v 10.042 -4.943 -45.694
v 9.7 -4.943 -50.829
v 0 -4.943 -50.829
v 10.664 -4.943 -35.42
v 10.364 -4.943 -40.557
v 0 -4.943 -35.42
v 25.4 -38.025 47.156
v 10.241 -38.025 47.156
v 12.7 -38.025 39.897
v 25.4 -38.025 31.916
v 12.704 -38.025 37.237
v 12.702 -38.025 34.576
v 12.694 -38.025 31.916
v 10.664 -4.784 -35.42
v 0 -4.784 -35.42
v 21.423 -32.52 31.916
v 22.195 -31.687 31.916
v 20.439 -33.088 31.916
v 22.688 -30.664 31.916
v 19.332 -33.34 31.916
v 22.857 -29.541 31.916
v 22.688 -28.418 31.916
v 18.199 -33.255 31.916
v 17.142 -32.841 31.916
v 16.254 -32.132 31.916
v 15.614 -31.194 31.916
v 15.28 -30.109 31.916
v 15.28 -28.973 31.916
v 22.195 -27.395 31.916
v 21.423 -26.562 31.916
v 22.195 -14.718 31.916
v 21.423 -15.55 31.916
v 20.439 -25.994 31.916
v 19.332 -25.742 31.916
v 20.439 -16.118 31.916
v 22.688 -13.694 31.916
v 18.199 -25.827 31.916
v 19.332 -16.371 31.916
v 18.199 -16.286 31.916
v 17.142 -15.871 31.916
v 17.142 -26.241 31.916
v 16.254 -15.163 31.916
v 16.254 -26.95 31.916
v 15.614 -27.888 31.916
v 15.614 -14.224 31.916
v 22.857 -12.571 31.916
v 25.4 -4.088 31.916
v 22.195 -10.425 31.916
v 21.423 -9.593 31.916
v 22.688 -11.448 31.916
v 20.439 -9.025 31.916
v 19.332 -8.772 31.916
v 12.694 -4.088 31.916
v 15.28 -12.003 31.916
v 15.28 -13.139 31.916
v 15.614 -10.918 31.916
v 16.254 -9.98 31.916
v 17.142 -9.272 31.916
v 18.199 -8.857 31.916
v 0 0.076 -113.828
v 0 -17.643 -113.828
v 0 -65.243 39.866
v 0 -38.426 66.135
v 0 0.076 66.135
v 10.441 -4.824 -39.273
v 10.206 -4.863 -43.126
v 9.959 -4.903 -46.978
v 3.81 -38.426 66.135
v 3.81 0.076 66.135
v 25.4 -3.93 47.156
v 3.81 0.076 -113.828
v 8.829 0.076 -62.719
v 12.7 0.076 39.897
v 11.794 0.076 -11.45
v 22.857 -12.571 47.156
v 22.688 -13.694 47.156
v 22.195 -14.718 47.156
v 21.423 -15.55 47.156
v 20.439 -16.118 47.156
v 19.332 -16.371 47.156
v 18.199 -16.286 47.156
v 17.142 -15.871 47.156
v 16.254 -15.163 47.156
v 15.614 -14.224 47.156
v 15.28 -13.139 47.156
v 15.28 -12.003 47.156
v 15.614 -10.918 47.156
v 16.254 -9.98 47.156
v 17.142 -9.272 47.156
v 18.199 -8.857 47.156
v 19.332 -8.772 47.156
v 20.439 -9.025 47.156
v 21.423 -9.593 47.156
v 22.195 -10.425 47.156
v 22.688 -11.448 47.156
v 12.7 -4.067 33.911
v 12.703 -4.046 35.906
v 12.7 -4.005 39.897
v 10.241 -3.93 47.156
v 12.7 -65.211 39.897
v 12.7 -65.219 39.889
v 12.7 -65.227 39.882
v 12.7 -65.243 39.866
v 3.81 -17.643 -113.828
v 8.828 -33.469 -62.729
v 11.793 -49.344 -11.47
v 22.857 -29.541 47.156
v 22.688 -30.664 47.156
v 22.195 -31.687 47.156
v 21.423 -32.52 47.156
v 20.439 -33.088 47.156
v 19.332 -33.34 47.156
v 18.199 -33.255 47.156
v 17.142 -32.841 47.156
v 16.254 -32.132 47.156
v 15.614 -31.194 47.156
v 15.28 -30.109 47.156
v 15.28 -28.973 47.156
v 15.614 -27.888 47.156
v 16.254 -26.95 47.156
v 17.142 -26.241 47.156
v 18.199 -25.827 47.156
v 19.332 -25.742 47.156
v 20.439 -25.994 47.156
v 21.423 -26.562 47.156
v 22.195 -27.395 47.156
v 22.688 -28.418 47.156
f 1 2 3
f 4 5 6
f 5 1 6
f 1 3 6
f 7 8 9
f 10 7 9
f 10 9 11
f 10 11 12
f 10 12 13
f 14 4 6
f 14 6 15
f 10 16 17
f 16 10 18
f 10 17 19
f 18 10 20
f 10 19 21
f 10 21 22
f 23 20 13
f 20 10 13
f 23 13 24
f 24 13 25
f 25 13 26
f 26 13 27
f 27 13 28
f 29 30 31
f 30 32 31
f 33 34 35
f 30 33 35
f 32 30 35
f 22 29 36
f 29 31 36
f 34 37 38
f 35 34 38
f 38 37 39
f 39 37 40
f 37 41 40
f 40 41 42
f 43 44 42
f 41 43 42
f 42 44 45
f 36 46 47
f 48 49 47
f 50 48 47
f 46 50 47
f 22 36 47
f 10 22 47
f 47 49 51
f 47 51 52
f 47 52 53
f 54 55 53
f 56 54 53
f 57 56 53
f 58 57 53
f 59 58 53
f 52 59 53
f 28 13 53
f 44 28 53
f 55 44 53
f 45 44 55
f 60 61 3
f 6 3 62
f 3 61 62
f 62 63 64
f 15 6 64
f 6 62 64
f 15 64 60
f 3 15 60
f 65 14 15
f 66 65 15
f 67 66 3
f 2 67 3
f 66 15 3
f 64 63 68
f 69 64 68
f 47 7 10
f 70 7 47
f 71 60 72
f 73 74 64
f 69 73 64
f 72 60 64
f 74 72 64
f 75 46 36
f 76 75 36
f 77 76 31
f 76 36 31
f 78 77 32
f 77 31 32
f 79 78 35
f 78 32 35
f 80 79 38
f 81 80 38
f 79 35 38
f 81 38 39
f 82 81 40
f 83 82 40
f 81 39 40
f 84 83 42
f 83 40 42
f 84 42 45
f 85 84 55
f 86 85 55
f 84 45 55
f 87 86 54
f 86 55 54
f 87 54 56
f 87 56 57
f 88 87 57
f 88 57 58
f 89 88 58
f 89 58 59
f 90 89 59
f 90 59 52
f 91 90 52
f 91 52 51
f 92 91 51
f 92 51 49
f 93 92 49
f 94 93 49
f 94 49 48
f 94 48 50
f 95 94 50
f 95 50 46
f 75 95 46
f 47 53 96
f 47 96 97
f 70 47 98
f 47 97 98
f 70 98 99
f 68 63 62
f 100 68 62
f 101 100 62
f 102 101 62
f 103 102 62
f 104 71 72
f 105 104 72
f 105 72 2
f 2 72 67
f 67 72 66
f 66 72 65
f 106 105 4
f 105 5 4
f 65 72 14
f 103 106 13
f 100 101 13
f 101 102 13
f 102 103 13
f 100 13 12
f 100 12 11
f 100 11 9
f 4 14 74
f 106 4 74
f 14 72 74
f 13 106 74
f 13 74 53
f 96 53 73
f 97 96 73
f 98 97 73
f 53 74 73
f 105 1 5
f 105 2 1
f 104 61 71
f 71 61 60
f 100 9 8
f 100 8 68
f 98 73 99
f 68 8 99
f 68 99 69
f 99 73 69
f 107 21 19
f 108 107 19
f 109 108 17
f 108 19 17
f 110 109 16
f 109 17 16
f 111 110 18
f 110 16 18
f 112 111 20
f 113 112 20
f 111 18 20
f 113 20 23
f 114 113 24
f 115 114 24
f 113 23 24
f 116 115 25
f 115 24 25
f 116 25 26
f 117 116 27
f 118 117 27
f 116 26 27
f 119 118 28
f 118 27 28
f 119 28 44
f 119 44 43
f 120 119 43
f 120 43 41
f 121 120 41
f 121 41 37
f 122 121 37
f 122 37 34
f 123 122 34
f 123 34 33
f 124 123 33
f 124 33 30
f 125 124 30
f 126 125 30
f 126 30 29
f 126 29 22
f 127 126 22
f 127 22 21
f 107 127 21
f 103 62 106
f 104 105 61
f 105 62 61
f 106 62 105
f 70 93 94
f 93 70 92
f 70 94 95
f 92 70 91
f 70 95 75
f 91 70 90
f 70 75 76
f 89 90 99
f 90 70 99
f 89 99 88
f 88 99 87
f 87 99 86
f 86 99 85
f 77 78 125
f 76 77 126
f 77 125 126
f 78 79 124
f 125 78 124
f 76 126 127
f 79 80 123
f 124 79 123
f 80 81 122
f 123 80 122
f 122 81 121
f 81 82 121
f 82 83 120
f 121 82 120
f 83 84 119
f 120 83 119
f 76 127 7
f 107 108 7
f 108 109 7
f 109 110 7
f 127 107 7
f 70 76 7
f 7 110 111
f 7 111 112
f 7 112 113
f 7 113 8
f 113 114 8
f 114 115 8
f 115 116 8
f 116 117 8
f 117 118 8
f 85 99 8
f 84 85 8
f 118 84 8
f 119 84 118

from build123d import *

# Parameters (mm, degrees)
F1_DEPTH   = 25.4
F3_DEPTH   = 25.4
F1_FACE1_W = 25.4
F1_FACE1_H = 38.1020354138
F4_DEPTH   = 76.2
F5_DEPTH   = 25.4
F6_R       = 3.81
F7_DEPTH   = 25.4


with BuildPart() as f1:
    # F0 (on Right) → F1 (new body)
    with BuildSketch(Plane.YZ):
        Polygon((-3.7335716031, 66.174152714), (-38.0235716031, 66.5286004045), (-65.2428203725, 39.8663124475), (-17.6430062947, -113.8280024187), (-4.9430062947, -113.8280024187), (-4.9430062947, -50.8290516523), (-4.9430062947, -35.4195966316), (-4.783722371, -35.4195966316), (-4.0876944394, 31.9155797899), (-38.02458931, 31.9155797899), (-38.02458931, 47.1555797899), (-3.9301621325, 47.1555797899), align=None)
        Polygon((0.0764283969, 31.9155797899), (-4.0876944394, 31.9155797899), (-4.783722371, -35.4195966316), (0.0764283969, -35.4195966316), align=None)
        Polygon((-4.9430062947, -50.8290516523), (-4.9430062947, -113.8280024187), (0.0764283969, -113.8280024187), (0.0764283969, -35.4195966316), (-4.783722371, -35.4195966316), align=None)
        Polygon((0.0764283969, 66.1347696372), (-3.7335716031, 66.174152714), (-3.9301621325, 47.1555797899), (0.0764283969, 47.1555797899), align=None)
        Polygon((0.0764283969, 47.1555797899), (-3.9301621325, 47.1555797899), (-4.0876944394, 31.9155797899), (0.0764283969, 31.9155797899), align=None)
    extrude(amount=F1_DEPTH)

    # F0 (on Right) → F3 (join)
    with BuildSketch(Plane.YZ):
        Polygon((-4.0876944394, 31.9155797899), (-3.9301621325, 47.1555797899), (-38.02458931, 47.1555797899), (-38.02458931, 31.9155797899), align=None)
    extrude(amount=F3_DEPTH)

    # F2 (on face) + F1_face1 (on face) → F4 (cut)
    with BuildSketch(Plane(origin=(0, 0.0764283969, 0), x_dir=(-1, 0, 0), z_dir=(0, 1, 0))):
        Polygon((-12.7, 55.3310290966), (-3.81, 66.1347696372), (-12.7, 66.1347696372), align=None)
        with BuildLine():
            ThreePointArc((-12.7, -113.8280024187), (-22.1716577551, -37.2233399355), (-25.4, 39.8971140385))
            Line((-25.4, 39.8971140385), (-25.4, -113.8280024187))
            Line((-25.4, -113.8280024187), (-12.7, -113.8280024187))
        make_face()
        Polygon((-12.7, 55.3310290966), (-12.7, 66.1347696372), (-25.4, 66.1347696372), (-25.4, 39.8971140385), align=None)
        Polygon((-12.7, 39.8971140385), (-3.81, 66.1347696372), (-12.7, 55.3310290966), align=None)
        Polygon((-25.4, 39.8971140385), (-12.7, 39.8971140385), (-12.7, 55.3310290966), align=None)
        with BuildLine():
            ThreePointArc((-3.81, -113.8280024187), (-10.5684247316, -37.0992306938), (-12.7, 39.8971140385))
            Line((-12.7, 39.8971140385), (-25.4, 39.8971140385))
            ThreePointArc((-25.4, 39.8971140385), (-22.1716577551, -37.2233399355), (-12.7, -113.8280024187))
            Line((-12.7, -113.8280024187), (-3.81, -113.8280024187))
        make_face()
    with BuildSketch(Plane(origin=(12.7, -18.9735716031, 66.3316850209), x_dir=(1, 0, 0), z_dir=(0, 0.0103362134, 0.9999465799))):
        Rectangle(F1_FACE1_W, F1_FACE1_H)
    extrude(amount=-F4_DEPTH, dir=(0, 1, 0), mode=Mode.SUBTRACT)

    # F0 (on Right) → F5 (join)
    with BuildSketch(Plane.YZ):
        Polygon((-4.0876944394, 31.9155797899), (-3.9301621325, 47.1555797899), (-38.02458931, 47.1555797899), (-38.02458931, 31.9155797899), align=None)
    extrude(amount=F5_DEPTH)

    # F6 (on face) → F7 (cut)
    with BuildSketch(Plane(origin=(0, 0, 31.9155797899), x_dir=(1, 0, 0), z_dir=(0, 0, -1))):
        with Locations((19.0471851579, 12.5712944394)):
            Circle(F6_R)
        with Locations((19.0471851579, 29.54098931)):
            Circle(F6_R)
    extrude(amount=-F7_DEPTH, mode=Mode.SUBTRACT)


solid = f1.part
